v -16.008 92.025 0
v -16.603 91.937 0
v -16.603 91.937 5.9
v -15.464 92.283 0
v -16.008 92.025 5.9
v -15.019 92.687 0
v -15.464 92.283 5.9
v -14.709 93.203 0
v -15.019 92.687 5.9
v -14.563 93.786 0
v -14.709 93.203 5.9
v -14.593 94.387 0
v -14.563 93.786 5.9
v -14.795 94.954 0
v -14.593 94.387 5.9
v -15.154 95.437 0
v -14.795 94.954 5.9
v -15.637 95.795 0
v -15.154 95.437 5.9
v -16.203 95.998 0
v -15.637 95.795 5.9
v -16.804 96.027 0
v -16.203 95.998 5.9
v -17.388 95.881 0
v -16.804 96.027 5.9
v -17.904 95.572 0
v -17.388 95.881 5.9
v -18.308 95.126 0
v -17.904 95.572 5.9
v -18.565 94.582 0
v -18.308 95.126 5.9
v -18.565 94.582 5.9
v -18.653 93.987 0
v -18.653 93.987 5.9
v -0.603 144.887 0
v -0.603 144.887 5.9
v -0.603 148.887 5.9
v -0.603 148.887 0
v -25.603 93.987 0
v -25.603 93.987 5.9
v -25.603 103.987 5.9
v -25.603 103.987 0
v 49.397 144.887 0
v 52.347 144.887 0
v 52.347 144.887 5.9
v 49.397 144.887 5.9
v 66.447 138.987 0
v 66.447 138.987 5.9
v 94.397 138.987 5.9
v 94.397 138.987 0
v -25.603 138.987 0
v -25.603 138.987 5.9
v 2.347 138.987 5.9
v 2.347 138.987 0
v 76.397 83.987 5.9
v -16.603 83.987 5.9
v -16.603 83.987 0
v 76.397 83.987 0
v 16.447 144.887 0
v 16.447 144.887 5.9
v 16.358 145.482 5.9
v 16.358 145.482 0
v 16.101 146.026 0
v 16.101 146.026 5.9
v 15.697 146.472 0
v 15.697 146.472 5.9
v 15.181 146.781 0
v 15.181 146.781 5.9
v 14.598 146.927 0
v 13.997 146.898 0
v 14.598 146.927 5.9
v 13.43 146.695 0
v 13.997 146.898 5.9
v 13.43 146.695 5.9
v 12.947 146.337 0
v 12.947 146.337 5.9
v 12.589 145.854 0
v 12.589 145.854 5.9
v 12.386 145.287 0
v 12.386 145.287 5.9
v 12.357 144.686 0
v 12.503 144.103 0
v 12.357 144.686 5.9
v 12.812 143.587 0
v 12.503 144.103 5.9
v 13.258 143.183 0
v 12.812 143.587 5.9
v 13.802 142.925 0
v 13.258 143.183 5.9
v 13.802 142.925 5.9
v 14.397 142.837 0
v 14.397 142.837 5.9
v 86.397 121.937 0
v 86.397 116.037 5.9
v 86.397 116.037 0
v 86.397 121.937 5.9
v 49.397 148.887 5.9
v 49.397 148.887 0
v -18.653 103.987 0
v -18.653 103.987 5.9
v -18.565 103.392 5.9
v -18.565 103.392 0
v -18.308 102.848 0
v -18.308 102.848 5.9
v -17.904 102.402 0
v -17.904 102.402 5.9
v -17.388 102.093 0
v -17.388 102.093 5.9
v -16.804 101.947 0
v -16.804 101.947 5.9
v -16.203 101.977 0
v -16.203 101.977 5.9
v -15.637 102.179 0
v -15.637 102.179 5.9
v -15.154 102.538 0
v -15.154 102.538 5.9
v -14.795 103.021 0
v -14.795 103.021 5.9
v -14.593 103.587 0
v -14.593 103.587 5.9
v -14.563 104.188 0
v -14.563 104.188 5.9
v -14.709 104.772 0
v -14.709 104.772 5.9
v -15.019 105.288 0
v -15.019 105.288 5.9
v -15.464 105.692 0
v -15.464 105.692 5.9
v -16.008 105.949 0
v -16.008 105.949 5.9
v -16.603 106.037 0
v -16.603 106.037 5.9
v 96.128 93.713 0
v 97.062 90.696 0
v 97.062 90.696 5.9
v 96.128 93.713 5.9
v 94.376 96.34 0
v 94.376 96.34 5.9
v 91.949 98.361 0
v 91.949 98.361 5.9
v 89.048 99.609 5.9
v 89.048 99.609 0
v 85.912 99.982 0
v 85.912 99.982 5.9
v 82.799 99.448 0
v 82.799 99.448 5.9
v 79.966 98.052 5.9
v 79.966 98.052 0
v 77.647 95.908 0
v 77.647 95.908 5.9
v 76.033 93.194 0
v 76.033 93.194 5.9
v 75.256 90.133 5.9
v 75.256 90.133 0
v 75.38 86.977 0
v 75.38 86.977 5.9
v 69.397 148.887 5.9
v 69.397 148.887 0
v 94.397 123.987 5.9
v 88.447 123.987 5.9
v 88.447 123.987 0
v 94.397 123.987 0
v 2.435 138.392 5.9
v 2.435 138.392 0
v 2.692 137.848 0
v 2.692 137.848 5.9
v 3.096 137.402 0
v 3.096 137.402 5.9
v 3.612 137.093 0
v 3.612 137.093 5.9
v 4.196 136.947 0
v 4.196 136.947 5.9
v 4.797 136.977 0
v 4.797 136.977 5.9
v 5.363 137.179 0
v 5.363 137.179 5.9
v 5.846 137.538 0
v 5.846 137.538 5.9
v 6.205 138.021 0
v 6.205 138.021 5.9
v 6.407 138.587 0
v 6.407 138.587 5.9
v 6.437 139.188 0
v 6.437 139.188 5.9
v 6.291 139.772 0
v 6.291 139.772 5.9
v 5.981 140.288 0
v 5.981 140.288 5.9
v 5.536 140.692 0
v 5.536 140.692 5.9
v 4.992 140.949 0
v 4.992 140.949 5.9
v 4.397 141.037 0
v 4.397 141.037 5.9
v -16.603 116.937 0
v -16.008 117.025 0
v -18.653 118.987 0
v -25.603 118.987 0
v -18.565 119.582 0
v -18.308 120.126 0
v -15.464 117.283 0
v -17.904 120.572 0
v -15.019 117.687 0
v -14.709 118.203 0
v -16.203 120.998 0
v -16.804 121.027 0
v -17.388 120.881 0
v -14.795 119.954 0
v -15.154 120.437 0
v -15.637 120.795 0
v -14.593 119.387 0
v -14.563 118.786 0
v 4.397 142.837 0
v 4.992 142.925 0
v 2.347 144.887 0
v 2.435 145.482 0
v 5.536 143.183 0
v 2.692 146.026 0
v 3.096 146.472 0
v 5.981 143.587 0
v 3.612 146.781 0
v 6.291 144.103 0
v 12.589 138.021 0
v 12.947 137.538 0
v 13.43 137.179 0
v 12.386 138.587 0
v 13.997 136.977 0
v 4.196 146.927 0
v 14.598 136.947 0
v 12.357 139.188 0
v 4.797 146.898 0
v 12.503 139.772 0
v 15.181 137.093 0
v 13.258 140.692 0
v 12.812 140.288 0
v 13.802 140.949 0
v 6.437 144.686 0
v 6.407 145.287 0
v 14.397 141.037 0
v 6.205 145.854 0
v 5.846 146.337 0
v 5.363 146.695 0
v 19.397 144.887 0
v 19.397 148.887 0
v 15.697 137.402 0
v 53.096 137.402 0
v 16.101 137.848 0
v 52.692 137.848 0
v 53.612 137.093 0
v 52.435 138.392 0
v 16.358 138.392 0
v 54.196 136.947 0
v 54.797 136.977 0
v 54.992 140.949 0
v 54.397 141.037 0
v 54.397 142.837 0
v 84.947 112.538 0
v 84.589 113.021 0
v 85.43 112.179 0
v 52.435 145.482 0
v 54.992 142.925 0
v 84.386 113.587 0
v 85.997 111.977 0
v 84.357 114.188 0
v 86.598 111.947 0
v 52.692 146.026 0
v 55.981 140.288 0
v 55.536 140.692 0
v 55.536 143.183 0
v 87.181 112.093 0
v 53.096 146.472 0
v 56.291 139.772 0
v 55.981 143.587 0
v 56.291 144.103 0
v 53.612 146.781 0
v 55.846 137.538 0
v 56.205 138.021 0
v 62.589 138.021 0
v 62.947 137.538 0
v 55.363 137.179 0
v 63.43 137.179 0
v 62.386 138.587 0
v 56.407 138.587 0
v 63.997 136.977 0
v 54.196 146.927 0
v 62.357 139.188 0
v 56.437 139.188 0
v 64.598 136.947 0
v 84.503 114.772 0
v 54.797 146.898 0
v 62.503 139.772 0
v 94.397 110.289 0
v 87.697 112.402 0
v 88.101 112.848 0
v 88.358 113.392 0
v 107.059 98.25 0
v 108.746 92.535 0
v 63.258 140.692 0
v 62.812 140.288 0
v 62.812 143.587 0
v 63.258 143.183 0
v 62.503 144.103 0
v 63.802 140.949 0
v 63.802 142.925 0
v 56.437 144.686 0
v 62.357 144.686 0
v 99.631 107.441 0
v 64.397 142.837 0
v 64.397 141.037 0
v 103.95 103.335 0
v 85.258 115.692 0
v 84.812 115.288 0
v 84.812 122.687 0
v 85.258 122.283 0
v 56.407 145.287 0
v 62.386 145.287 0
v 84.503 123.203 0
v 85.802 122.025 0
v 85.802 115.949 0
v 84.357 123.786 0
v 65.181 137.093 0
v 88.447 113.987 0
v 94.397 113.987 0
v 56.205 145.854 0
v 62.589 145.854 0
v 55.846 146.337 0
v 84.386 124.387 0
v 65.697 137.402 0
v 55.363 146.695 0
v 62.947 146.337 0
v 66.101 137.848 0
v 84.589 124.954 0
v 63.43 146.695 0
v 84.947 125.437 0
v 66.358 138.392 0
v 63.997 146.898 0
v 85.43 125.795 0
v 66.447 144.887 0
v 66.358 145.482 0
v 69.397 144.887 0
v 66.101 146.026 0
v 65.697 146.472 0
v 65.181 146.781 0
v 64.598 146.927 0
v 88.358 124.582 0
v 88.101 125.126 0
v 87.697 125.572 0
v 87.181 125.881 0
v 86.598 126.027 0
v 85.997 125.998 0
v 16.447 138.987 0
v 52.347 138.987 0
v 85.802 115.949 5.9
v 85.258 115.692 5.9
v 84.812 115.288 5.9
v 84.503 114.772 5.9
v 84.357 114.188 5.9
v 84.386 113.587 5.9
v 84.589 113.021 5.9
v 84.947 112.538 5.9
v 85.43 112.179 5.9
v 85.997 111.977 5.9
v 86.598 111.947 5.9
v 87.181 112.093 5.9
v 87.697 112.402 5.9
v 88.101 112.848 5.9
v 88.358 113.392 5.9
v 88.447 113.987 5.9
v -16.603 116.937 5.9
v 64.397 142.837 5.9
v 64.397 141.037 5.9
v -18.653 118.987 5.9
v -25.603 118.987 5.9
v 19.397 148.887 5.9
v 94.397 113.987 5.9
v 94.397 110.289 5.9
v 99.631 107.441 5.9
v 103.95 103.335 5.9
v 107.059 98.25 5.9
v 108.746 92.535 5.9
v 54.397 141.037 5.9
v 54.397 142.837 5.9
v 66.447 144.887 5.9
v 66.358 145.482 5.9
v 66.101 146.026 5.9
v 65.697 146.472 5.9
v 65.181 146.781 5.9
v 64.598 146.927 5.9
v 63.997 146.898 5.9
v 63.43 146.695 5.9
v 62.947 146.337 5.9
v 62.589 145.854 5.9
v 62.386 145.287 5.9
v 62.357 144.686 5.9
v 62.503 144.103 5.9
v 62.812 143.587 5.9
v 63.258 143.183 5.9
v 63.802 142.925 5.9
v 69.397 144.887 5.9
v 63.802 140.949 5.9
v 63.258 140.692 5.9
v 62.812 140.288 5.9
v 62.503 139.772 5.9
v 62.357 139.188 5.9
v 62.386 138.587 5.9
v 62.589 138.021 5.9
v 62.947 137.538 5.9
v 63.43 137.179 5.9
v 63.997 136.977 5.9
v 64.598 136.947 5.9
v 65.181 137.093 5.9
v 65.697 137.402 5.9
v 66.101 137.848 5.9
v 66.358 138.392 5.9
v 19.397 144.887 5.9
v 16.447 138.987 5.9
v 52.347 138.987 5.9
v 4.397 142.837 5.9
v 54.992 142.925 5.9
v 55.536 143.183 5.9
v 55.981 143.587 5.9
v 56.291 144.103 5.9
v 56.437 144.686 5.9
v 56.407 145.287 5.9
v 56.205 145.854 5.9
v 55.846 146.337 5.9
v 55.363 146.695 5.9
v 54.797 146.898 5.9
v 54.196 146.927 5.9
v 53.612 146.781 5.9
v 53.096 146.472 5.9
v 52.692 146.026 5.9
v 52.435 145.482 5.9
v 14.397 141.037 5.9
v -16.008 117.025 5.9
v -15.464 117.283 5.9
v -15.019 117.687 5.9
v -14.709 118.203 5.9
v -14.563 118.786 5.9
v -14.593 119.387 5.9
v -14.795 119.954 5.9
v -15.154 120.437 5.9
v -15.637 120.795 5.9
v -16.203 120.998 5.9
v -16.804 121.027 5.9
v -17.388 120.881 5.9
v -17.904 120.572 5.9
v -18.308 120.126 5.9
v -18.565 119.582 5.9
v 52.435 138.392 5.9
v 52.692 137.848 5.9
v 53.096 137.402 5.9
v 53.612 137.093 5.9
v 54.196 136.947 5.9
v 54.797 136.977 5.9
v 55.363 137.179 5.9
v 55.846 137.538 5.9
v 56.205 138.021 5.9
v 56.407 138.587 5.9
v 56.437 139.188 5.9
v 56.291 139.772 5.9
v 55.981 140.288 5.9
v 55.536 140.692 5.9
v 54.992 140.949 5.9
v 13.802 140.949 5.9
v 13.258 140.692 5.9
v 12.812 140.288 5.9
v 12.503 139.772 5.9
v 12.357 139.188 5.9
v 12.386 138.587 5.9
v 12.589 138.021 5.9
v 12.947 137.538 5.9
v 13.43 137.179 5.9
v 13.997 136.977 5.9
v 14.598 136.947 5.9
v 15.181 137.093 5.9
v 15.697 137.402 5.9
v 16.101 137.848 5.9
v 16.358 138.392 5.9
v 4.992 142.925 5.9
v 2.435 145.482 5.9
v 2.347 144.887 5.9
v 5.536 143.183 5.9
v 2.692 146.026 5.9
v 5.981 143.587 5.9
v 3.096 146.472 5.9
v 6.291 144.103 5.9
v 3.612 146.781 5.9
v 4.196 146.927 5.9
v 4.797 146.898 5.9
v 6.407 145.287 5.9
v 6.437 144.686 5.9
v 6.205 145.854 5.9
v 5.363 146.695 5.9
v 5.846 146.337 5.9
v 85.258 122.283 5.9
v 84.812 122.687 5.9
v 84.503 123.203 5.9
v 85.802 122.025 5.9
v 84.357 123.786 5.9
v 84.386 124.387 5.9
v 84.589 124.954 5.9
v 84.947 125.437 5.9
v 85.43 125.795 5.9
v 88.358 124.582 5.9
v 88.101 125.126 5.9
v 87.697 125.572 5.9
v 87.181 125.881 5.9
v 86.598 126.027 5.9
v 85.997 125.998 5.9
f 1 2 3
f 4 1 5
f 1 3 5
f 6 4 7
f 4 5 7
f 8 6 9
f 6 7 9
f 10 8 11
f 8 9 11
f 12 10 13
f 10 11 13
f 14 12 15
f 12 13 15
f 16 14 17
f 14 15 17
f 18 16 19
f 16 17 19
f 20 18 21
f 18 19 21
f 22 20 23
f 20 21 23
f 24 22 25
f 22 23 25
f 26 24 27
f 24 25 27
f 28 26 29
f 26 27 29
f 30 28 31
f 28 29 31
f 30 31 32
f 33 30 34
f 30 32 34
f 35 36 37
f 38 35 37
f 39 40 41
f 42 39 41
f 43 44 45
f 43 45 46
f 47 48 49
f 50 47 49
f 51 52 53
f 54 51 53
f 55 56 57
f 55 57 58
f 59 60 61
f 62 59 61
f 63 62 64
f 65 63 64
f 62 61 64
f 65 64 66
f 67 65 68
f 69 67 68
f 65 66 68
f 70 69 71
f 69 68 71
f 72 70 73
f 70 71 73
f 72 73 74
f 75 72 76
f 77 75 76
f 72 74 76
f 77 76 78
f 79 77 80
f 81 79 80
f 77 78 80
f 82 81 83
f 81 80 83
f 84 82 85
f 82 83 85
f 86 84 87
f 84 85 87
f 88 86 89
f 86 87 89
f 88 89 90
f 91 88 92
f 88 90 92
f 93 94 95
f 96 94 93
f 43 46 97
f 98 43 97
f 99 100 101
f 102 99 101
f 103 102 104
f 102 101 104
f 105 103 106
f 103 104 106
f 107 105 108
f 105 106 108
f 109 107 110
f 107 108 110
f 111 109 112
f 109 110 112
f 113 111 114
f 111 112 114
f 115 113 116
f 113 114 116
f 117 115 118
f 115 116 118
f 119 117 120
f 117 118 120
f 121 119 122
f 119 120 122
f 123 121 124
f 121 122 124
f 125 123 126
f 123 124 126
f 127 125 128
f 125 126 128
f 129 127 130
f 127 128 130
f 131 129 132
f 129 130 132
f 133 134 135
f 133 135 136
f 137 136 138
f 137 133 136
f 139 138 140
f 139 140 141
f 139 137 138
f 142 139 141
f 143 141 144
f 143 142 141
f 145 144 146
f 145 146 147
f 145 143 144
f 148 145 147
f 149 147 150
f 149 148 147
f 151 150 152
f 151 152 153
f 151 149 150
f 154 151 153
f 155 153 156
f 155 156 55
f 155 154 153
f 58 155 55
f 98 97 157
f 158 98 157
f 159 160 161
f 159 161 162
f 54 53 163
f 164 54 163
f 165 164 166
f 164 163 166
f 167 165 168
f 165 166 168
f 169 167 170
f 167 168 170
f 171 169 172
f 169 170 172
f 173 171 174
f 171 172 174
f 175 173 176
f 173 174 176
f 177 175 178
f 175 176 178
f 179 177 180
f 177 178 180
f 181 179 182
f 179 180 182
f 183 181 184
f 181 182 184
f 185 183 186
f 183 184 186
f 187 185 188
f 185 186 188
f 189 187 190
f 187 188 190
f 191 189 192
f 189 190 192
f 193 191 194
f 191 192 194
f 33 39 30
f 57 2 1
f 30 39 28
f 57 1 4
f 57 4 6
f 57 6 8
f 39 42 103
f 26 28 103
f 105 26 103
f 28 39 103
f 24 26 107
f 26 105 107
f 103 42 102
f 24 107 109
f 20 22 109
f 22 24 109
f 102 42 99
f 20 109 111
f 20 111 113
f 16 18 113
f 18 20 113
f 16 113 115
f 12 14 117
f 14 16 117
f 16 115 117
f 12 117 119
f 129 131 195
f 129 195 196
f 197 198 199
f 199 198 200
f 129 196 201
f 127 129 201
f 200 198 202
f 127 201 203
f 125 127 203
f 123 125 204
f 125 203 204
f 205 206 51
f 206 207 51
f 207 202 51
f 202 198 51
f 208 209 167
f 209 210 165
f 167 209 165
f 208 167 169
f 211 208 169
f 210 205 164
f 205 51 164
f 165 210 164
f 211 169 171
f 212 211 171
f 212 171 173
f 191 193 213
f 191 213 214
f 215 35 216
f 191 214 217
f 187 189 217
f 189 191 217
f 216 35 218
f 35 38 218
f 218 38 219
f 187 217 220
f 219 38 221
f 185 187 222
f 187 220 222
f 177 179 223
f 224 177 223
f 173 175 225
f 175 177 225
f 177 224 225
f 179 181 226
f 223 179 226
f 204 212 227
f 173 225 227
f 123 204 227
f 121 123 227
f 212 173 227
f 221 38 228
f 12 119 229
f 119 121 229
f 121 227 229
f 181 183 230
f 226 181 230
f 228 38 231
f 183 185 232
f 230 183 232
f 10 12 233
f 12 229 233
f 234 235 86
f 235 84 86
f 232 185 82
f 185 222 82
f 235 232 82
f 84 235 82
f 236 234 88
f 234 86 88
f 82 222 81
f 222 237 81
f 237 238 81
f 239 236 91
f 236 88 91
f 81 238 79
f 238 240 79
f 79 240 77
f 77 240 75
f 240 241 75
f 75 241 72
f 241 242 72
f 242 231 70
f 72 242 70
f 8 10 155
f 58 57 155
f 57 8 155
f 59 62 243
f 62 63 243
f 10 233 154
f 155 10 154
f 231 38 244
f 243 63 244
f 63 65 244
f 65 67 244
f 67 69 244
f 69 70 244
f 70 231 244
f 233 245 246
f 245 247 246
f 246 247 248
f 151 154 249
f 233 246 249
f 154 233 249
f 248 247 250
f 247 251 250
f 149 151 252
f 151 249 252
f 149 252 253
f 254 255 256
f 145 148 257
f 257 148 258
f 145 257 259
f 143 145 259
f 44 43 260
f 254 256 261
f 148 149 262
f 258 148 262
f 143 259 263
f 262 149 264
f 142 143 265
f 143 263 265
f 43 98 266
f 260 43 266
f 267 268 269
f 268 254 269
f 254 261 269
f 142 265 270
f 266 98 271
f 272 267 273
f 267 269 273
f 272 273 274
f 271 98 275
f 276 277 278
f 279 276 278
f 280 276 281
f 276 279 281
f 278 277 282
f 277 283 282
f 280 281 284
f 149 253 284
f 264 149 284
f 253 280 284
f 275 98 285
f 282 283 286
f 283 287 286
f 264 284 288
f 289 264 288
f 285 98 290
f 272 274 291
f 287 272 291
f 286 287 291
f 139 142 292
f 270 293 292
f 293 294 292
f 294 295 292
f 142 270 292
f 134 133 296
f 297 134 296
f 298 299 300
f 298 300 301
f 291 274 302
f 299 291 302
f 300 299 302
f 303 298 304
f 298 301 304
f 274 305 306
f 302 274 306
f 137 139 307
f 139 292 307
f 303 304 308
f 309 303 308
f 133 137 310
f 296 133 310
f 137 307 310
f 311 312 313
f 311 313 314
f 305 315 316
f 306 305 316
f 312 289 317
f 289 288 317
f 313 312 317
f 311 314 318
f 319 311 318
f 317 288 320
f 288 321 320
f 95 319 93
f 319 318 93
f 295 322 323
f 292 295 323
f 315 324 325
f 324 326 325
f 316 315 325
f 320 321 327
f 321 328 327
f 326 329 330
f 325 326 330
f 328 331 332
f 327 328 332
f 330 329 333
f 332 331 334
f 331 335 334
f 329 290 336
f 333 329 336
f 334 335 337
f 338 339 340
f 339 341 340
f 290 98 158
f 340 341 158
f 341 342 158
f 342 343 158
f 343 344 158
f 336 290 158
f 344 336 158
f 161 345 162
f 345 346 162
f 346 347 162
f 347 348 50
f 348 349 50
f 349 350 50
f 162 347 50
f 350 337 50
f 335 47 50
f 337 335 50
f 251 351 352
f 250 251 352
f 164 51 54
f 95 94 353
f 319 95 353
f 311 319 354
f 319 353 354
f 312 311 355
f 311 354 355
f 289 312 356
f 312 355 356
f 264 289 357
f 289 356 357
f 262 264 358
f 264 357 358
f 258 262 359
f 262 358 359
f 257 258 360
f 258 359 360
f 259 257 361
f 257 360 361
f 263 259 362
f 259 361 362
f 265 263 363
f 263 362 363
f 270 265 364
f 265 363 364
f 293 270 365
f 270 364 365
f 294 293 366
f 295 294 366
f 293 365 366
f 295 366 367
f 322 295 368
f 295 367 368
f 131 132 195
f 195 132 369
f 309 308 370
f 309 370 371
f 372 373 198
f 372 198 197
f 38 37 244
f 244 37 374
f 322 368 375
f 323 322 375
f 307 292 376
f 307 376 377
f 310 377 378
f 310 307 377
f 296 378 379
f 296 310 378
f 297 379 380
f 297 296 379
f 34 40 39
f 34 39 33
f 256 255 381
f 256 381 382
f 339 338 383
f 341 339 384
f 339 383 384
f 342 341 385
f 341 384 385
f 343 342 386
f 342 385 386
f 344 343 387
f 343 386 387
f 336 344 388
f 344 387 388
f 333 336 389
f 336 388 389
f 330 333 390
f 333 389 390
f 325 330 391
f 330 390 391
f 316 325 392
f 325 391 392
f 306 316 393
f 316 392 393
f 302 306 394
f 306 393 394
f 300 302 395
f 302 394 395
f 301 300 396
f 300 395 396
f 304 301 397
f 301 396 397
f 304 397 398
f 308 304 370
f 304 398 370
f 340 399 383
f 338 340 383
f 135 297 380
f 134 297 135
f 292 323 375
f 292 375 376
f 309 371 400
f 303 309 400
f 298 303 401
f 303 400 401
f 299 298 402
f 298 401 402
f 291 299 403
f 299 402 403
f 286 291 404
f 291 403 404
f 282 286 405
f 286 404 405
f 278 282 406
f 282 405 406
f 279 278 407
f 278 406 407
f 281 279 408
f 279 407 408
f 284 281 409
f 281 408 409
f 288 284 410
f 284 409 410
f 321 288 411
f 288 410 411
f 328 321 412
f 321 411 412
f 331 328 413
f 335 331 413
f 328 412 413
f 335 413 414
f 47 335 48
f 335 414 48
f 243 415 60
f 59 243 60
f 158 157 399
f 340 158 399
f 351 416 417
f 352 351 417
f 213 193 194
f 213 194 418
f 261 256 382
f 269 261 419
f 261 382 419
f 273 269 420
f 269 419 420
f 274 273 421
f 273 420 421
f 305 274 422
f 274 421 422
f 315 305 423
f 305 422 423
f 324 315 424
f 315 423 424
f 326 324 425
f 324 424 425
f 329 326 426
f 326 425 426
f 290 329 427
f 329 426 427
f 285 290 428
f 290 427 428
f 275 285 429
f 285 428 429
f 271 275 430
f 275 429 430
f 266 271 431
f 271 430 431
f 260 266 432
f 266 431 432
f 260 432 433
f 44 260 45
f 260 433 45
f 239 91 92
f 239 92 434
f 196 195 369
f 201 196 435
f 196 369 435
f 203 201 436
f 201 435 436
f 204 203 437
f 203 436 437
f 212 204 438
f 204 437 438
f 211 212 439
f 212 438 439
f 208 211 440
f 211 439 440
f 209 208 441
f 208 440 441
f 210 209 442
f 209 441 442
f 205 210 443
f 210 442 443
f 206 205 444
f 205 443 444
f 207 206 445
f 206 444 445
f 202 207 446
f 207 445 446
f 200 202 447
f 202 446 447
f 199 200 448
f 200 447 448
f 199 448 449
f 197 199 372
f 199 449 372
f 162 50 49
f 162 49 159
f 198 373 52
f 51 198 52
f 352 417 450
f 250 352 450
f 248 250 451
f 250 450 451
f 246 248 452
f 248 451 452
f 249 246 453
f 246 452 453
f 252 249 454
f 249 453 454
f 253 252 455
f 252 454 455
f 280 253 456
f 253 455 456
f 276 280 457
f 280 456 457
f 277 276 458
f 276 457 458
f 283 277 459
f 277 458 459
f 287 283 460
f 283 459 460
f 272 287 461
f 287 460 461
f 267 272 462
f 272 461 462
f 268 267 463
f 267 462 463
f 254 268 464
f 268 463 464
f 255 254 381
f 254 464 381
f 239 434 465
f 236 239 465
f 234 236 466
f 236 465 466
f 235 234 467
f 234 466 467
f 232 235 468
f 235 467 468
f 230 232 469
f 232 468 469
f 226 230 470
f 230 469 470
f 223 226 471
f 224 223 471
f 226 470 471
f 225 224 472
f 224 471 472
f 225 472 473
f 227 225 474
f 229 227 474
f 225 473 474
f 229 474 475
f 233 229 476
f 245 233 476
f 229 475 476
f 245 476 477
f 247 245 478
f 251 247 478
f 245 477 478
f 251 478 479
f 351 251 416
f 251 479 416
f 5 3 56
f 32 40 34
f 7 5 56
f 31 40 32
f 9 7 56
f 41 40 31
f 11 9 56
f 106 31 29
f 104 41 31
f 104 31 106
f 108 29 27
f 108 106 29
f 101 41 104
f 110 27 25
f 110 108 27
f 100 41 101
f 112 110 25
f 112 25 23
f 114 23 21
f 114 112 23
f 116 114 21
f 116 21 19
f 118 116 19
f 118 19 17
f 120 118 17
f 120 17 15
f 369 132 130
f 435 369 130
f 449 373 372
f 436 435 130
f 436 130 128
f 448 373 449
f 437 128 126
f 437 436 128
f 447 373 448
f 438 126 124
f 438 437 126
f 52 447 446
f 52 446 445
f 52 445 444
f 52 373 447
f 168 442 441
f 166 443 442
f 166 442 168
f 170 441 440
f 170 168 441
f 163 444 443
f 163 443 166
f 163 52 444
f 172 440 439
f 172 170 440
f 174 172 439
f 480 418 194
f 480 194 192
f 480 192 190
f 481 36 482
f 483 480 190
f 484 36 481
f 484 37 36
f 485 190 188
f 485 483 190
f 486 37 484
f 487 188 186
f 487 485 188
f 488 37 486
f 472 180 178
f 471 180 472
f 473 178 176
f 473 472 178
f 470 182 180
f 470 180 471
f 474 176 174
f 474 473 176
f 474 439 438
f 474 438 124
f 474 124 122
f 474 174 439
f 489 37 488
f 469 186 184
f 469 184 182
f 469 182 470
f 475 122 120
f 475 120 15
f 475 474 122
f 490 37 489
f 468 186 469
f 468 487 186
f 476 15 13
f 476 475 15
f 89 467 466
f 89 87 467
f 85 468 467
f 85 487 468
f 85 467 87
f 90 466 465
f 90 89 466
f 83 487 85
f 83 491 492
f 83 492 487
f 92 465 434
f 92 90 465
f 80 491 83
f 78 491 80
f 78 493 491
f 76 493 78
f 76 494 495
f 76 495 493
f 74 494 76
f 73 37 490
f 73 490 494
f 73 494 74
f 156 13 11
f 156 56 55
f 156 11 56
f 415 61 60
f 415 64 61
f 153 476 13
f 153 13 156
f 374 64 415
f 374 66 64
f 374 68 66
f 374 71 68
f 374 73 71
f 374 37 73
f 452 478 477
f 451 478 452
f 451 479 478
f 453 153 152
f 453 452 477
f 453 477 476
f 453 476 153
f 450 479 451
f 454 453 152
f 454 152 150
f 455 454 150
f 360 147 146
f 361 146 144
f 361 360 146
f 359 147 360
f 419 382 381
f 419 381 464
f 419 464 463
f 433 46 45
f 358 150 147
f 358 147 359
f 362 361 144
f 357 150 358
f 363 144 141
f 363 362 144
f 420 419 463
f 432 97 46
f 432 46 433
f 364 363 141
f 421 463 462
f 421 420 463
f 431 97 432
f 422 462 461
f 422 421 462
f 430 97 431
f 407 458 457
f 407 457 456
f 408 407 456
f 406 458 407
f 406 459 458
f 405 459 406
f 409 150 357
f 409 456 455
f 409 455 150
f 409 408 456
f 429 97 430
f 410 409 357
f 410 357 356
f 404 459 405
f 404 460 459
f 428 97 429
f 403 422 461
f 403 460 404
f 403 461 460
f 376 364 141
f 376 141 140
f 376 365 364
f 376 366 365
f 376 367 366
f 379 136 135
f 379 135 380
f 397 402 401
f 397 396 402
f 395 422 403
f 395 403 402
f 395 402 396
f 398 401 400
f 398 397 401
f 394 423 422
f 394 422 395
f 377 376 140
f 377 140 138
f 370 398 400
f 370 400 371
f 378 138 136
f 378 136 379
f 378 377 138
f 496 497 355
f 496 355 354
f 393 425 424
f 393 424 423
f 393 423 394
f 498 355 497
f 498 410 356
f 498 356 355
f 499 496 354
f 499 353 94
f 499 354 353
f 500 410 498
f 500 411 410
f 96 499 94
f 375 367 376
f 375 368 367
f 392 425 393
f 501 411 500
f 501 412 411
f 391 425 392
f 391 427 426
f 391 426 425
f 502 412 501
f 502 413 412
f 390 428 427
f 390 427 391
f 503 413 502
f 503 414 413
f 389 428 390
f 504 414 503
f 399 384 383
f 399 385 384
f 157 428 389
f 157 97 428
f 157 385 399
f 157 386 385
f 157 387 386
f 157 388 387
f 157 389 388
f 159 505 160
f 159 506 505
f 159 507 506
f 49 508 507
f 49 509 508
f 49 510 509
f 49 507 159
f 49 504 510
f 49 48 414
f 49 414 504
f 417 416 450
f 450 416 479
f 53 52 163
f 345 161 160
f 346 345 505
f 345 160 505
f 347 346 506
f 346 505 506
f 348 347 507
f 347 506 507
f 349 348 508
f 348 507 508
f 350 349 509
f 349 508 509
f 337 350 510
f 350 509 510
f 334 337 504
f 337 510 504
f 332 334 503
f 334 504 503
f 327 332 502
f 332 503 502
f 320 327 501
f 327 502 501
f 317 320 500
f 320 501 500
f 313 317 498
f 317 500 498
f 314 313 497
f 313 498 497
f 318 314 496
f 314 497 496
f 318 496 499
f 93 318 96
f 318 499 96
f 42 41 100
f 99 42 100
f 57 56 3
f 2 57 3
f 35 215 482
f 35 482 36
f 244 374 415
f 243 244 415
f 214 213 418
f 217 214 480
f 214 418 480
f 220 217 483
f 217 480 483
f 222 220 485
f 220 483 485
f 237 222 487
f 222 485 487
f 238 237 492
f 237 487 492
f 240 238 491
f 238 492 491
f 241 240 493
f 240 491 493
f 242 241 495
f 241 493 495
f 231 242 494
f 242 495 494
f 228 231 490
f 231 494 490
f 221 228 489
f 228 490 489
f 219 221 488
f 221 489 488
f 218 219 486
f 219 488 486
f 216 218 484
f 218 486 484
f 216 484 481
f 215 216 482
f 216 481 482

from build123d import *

# Parameters (mm, degrees)
BOSS_EXTRUDE1_DEPTH = 5.9
SKETCH2_W           = 8
SKETCH2_H           = 55
BOSS_EXTRUDE2_DEPTH = 5.9
SKETCH3_W           = 9
SKETCH3_H           = 15
SKETCH3_W_2         = 8
SKETCH3_H_2         = 10
CUT_EXTRUDE1_DEPTH  = 6.9
BOSS_EXTRUDE3_DEPTH = 5.9
CUT_EXTRUDE2_REACH  = 7.9
SKETCH5_R           = 2.05


with BuildPart() as part:
    # Sketch1 → Boss-Extrude1 (new body)
    with BuildSketch(Plane.XY):
        with BuildLine():
            ThreePointArc((97.061822228, 90.695765473), (82.799132124, 99.447826237), (76.396720763, 83.987165662))
            Line((76.396720763, 83.987165662), (-17.603279237, 83.987165662))
            Line((-17.603279237, 83.987165662), (-17.603279237, 138.987165662))
            Line((-17.603279237, 138.987165662), (94.396720763, 138.987165662))
            Line((94.396720763, 138.987165662), (94.396720763, 110.289306386))
            ThreePointArc((94.396720763, 110.289306386), (103.949970876, 103.334562845), (108.745956392, 92.534953205))
            Line((108.745956392, 92.534953205), (97.061822228, 90.695765473))
        make_face()
    extrude(amount=BOSS_EXTRUDE1_DEPTH)

    # Sketch2 → Boss-Extrude2 (add)
    with BuildSketch(Plane.XY.offset(5.9)):
        with Locations((-21.603279237, 111.487165662)):
            Rectangle(SKETCH2_W, SKETCH2_H)
    extrude(amount=-BOSS_EXTRUDE2_DEPTH)

    # Sketch3 → Cut-Extrude1 (cut, through all)
    with BuildSketch(Plane.XY.offset(5.9)):
        with Locations((-21.103279237, 111.487165662)):
            Rectangle(SKETCH3_W, SKETCH3_H)
        with Locations((90.396720763, 118.987165662)):
            Rectangle(SKETCH3_W_2, SKETCH3_H_2)
        with Locations((-21.103279237, 88.987165662)):
            Rectangle(SKETCH3_W, SKETCH3_H_2)
    extrude(amount=-CUT_EXTRUDE1_DEPTH, mode=Mode.SUBTRACT)

    # Sketch4 → Boss-Extrude3 (add)
    with BuildSketch(Plane.XY.offset(5.9)):
        Polygon((4.396720763, 138.987165662), (4.396720763, 144.887165662), (-0.603279237, 144.887165662), (-0.603279237, 148.887165662), (19.396720763, 148.887165662), (19.396720763, 144.887165662), (14.396720763, 144.887165662), (14.396720763, 138.987165662), align=None)
        Polygon((49.396720763, 144.887165662), (49.396720763, 148.887165662), (69.396720763, 148.887165662), (69.396720763, 144.887165662), (64.396720763, 144.887165662), (64.396720763, 138.987165662), (54.396720763, 138.987165662), (54.396720763, 144.887165662), align=None)
    extrude(amount=-BOSS_EXTRUDE3_DEPTH)

    # Sketch5 → Cut-Extrude2 (cut, up to next)
    with BuildSketch(Plane.XY.offset(5.9), mode=Mode.PRIVATE) as cut_extrude2_sk1:
        with Locations((-16.603279237, 93.987165662)):
            Circle(SKETCH5_R)
    cut_extrude2_tool1 = extrude(cut_extrude2_sk1.sketch, amount=-CUT_EXTRUDE2_REACH, mode=Mode.PRIVATE) & part.part
    add(cut_extrude2_tool1.solids().sort_by_distance((-16.603279, 93.987166, 5.9))[0], mode=Mode.SUBTRACT)
    # Sketch5 → Cut-Extrude2 (cut, up to next)
    with BuildSketch(Plane.XY.offset(5.9), mode=Mode.PRIVATE) as cut_extrude2_sk2:
        with Locations((-16.603279237, 103.987165662)):
            Circle(SKETCH5_R)
    cut_extrude2_tool2 = extrude(cut_extrude2_sk2.sketch, amount=-CUT_EXTRUDE2_REACH, mode=Mode.PRIVATE) & part.part
    add(cut_extrude2_tool2.solids().sort_by_distance((-16.603279, 103.987166, 5.9))[0], mode=Mode.SUBTRACT)
    # Sketch5 → Cut-Extrude2 (cut, up to next)
    with BuildSketch(Plane.XY.offset(5.9), mode=Mode.PRIVATE) as cut_extrude2_sk3:
        with Locations((-16.603279237, 118.987165662)):
            Circle(SKETCH5_R)
    cut_extrude2_tool3 = extrude(cut_extrude2_sk3.sketch, amount=-CUT_EXTRUDE2_REACH, mode=Mode.PRIVATE) & part.part
    add(cut_extrude2_tool3.solids().sort_by_distance((-16.603279, 118.987166, 5.9))[0], mode=Mode.SUBTRACT)
    # Sketch5 → Cut-Extrude2 (cut, up to next)
    with BuildSketch(Plane.XY.offset(5.9), mode=Mode.PRIVATE) as cut_extrude2_sk4:
        with Locations((4.396720763, 138.987165662)):
            Circle(SKETCH5_R)
    cut_extrude2_tool4 = extrude(cut_extrude2_sk4.sketch, amount=-CUT_EXTRUDE2_REACH, mode=Mode.PRIVATE) & part.part
    add(cut_extrude2_tool4.solids().sort_by_distance((4.396721, 138.987166, 5.9))[0], mode=Mode.SUBTRACT)
    # Sketch5 → Cut-Extrude2 (cut, up to next)
    with BuildSketch(Plane.XY.offset(5.9), mode=Mode.PRIVATE) as cut_extrude2_sk5:
        with Locations((14.396720763, 138.987165662)):
            Circle(SKETCH5_R)
    cut_extrude2_tool5 = extrude(cut_extrude2_sk5.sketch, amount=-CUT_EXTRUDE2_REACH, mode=Mode.PRIVATE) & part.part
    add(cut_extrude2_tool5.solids().sort_by_distance((14.396721, 138.987166, 5.9))[0], mode=Mode.SUBTRACT)
    # Sketch5 → Cut-Extrude2 (cut, up to next)
    with BuildSketch(Plane.XY.offset(5.9), mode=Mode.PRIVATE) as cut_extrude2_sk6:
        with Locations((14.396720763, 144.887165662)):
            Circle(SKETCH5_R)
    cut_extrude2_tool6 = extrude(cut_extrude2_sk6.sketch, amount=-CUT_EXTRUDE2_REACH, mode=Mode.PRIVATE) & part.part
    add(cut_extrude2_tool6.solids().sort_by_distance((14.396721, 144.887166, 5.9))[0], mode=Mode.SUBTRACT)
    # Sketch5 → Cut-Extrude2 (cut, up to next)
    with BuildSketch(Plane.XY.offset(5.9), mode=Mode.PRIVATE) as cut_extrude2_sk7:
        with Locations((4.396720763, 144.887165662)):
            Circle(SKETCH5_R)
    cut_extrude2_tool7 = extrude(cut_extrude2_sk7.sketch, amount=-CUT_EXTRUDE2_REACH, mode=Mode.PRIVATE) & part.part
    add(cut_extrude2_tool7.solids().sort_by_distance((4.396721, 144.887166, 5.9))[0], mode=Mode.SUBTRACT)
    # Sketch5 → Cut-Extrude2 (cut, up to next)
    with BuildSketch(Plane.XY.offset(5.9), mode=Mode.PRIVATE) as cut_extrude2_sk8:
        with Locations((54.396720763, 144.887165662)):
            Circle(SKETCH5_R)
    cut_extrude2_tool8 = extrude(cut_extrude2_sk8.sketch, amount=-CUT_EXTRUDE2_REACH, mode=Mode.PRIVATE) & part.part
    add(cut_extrude2_tool8.solids().sort_by_distance((54.396721, 144.887166, 5.9))[0], mode=Mode.SUBTRACT)
    # Sketch5 → Cut-Extrude2 (cut, up to next)
    with BuildSketch(Plane.XY.offset(5.9), mode=Mode.PRIVATE) as cut_extrude2_sk9:
        with Locations((64.396720763, 144.887165662)):
            Circle(SKETCH5_R)
    cut_extrude2_tool9 = extrude(cut_extrude2_sk9.sketch, amount=-CUT_EXTRUDE2_REACH, mode=Mode.PRIVATE) & part.part
    add(cut_extrude2_tool9.solids().sort_by_distance((64.396721, 144.887166, 5.9))[0], mode=Mode.SUBTRACT)
    # Sketch5 → Cut-Extrude2 (cut, up to next)
    with BuildSketch(Plane.XY.offset(5.9), mode=Mode.PRIVATE) as cut_extrude2_sk10:
        with Locations((64.396720763, 138.987165662)):
            Circle(SKETCH5_R)
    cut_extrude2_tool10 = extrude(cut_extrude2_sk10.sketch, amount=-CUT_EXTRUDE2_REACH, mode=Mode.PRIVATE) & part.part
    add(cut_extrude2_tool10.solids().sort_by_distance((64.396721, 138.987166, 5.9))[0], mode=Mode.SUBTRACT)
    # Sketch5 → Cut-Extrude2 (cut, up to next)
    with BuildSketch(Plane.XY.offset(5.9), mode=Mode.PRIVATE) as cut_extrude2_sk11:
        with Locations((54.396720763, 138.987165662)):
            Circle(SKETCH5_R)
    cut_extrude2_tool11 = extrude(cut_extrude2_sk11.sketch, amount=-CUT_EXTRUDE2_REACH, mode=Mode.PRIVATE) & part.part
    add(cut_extrude2_tool11.solids().sort_by_distance((54.396721, 138.987166, 5.9))[0], mode=Mode.SUBTRACT)
    # Sketch5 → Cut-Extrude2 (cut, up to next)
    with BuildSketch(Plane.XY.offset(5.9), mode=Mode.PRIVATE) as cut_extrude2_sk12:
        with Locations((86.396720763, 123.987165662)):
            Circle(SKETCH5_R)
    cut_extrude2_tool12 = extrude(cut_extrude2_sk12.sketch, amount=-CUT_EXTRUDE2_REACH, mode=Mode.PRIVATE) & part.part
    add(cut_extrude2_tool12.solids().sort_by_distance((86.396721, 123.987166, 5.9))[0], mode=Mode.SUBTRACT)
    # Sketch5 → Cut-Extrude2 (cut, up to next)
    with BuildSketch(Plane.XY.offset(5.9), mode=Mode.PRIVATE) as cut_extrude2_sk13:
        with Locations((86.396720763, 113.987165662)):
            Circle(SKETCH5_R)
    cut_extrude2_tool13 = extrude(cut_extrude2_sk13.sketch, amount=-CUT_EXTRUDE2_REACH, mode=Mode.PRIVATE) & part.part
    add(cut_extrude2_tool13.solids().sort_by_distance((86.396721, 113.987166, 5.9))[0], mode=Mode.SUBTRACT)


solid = part.part
